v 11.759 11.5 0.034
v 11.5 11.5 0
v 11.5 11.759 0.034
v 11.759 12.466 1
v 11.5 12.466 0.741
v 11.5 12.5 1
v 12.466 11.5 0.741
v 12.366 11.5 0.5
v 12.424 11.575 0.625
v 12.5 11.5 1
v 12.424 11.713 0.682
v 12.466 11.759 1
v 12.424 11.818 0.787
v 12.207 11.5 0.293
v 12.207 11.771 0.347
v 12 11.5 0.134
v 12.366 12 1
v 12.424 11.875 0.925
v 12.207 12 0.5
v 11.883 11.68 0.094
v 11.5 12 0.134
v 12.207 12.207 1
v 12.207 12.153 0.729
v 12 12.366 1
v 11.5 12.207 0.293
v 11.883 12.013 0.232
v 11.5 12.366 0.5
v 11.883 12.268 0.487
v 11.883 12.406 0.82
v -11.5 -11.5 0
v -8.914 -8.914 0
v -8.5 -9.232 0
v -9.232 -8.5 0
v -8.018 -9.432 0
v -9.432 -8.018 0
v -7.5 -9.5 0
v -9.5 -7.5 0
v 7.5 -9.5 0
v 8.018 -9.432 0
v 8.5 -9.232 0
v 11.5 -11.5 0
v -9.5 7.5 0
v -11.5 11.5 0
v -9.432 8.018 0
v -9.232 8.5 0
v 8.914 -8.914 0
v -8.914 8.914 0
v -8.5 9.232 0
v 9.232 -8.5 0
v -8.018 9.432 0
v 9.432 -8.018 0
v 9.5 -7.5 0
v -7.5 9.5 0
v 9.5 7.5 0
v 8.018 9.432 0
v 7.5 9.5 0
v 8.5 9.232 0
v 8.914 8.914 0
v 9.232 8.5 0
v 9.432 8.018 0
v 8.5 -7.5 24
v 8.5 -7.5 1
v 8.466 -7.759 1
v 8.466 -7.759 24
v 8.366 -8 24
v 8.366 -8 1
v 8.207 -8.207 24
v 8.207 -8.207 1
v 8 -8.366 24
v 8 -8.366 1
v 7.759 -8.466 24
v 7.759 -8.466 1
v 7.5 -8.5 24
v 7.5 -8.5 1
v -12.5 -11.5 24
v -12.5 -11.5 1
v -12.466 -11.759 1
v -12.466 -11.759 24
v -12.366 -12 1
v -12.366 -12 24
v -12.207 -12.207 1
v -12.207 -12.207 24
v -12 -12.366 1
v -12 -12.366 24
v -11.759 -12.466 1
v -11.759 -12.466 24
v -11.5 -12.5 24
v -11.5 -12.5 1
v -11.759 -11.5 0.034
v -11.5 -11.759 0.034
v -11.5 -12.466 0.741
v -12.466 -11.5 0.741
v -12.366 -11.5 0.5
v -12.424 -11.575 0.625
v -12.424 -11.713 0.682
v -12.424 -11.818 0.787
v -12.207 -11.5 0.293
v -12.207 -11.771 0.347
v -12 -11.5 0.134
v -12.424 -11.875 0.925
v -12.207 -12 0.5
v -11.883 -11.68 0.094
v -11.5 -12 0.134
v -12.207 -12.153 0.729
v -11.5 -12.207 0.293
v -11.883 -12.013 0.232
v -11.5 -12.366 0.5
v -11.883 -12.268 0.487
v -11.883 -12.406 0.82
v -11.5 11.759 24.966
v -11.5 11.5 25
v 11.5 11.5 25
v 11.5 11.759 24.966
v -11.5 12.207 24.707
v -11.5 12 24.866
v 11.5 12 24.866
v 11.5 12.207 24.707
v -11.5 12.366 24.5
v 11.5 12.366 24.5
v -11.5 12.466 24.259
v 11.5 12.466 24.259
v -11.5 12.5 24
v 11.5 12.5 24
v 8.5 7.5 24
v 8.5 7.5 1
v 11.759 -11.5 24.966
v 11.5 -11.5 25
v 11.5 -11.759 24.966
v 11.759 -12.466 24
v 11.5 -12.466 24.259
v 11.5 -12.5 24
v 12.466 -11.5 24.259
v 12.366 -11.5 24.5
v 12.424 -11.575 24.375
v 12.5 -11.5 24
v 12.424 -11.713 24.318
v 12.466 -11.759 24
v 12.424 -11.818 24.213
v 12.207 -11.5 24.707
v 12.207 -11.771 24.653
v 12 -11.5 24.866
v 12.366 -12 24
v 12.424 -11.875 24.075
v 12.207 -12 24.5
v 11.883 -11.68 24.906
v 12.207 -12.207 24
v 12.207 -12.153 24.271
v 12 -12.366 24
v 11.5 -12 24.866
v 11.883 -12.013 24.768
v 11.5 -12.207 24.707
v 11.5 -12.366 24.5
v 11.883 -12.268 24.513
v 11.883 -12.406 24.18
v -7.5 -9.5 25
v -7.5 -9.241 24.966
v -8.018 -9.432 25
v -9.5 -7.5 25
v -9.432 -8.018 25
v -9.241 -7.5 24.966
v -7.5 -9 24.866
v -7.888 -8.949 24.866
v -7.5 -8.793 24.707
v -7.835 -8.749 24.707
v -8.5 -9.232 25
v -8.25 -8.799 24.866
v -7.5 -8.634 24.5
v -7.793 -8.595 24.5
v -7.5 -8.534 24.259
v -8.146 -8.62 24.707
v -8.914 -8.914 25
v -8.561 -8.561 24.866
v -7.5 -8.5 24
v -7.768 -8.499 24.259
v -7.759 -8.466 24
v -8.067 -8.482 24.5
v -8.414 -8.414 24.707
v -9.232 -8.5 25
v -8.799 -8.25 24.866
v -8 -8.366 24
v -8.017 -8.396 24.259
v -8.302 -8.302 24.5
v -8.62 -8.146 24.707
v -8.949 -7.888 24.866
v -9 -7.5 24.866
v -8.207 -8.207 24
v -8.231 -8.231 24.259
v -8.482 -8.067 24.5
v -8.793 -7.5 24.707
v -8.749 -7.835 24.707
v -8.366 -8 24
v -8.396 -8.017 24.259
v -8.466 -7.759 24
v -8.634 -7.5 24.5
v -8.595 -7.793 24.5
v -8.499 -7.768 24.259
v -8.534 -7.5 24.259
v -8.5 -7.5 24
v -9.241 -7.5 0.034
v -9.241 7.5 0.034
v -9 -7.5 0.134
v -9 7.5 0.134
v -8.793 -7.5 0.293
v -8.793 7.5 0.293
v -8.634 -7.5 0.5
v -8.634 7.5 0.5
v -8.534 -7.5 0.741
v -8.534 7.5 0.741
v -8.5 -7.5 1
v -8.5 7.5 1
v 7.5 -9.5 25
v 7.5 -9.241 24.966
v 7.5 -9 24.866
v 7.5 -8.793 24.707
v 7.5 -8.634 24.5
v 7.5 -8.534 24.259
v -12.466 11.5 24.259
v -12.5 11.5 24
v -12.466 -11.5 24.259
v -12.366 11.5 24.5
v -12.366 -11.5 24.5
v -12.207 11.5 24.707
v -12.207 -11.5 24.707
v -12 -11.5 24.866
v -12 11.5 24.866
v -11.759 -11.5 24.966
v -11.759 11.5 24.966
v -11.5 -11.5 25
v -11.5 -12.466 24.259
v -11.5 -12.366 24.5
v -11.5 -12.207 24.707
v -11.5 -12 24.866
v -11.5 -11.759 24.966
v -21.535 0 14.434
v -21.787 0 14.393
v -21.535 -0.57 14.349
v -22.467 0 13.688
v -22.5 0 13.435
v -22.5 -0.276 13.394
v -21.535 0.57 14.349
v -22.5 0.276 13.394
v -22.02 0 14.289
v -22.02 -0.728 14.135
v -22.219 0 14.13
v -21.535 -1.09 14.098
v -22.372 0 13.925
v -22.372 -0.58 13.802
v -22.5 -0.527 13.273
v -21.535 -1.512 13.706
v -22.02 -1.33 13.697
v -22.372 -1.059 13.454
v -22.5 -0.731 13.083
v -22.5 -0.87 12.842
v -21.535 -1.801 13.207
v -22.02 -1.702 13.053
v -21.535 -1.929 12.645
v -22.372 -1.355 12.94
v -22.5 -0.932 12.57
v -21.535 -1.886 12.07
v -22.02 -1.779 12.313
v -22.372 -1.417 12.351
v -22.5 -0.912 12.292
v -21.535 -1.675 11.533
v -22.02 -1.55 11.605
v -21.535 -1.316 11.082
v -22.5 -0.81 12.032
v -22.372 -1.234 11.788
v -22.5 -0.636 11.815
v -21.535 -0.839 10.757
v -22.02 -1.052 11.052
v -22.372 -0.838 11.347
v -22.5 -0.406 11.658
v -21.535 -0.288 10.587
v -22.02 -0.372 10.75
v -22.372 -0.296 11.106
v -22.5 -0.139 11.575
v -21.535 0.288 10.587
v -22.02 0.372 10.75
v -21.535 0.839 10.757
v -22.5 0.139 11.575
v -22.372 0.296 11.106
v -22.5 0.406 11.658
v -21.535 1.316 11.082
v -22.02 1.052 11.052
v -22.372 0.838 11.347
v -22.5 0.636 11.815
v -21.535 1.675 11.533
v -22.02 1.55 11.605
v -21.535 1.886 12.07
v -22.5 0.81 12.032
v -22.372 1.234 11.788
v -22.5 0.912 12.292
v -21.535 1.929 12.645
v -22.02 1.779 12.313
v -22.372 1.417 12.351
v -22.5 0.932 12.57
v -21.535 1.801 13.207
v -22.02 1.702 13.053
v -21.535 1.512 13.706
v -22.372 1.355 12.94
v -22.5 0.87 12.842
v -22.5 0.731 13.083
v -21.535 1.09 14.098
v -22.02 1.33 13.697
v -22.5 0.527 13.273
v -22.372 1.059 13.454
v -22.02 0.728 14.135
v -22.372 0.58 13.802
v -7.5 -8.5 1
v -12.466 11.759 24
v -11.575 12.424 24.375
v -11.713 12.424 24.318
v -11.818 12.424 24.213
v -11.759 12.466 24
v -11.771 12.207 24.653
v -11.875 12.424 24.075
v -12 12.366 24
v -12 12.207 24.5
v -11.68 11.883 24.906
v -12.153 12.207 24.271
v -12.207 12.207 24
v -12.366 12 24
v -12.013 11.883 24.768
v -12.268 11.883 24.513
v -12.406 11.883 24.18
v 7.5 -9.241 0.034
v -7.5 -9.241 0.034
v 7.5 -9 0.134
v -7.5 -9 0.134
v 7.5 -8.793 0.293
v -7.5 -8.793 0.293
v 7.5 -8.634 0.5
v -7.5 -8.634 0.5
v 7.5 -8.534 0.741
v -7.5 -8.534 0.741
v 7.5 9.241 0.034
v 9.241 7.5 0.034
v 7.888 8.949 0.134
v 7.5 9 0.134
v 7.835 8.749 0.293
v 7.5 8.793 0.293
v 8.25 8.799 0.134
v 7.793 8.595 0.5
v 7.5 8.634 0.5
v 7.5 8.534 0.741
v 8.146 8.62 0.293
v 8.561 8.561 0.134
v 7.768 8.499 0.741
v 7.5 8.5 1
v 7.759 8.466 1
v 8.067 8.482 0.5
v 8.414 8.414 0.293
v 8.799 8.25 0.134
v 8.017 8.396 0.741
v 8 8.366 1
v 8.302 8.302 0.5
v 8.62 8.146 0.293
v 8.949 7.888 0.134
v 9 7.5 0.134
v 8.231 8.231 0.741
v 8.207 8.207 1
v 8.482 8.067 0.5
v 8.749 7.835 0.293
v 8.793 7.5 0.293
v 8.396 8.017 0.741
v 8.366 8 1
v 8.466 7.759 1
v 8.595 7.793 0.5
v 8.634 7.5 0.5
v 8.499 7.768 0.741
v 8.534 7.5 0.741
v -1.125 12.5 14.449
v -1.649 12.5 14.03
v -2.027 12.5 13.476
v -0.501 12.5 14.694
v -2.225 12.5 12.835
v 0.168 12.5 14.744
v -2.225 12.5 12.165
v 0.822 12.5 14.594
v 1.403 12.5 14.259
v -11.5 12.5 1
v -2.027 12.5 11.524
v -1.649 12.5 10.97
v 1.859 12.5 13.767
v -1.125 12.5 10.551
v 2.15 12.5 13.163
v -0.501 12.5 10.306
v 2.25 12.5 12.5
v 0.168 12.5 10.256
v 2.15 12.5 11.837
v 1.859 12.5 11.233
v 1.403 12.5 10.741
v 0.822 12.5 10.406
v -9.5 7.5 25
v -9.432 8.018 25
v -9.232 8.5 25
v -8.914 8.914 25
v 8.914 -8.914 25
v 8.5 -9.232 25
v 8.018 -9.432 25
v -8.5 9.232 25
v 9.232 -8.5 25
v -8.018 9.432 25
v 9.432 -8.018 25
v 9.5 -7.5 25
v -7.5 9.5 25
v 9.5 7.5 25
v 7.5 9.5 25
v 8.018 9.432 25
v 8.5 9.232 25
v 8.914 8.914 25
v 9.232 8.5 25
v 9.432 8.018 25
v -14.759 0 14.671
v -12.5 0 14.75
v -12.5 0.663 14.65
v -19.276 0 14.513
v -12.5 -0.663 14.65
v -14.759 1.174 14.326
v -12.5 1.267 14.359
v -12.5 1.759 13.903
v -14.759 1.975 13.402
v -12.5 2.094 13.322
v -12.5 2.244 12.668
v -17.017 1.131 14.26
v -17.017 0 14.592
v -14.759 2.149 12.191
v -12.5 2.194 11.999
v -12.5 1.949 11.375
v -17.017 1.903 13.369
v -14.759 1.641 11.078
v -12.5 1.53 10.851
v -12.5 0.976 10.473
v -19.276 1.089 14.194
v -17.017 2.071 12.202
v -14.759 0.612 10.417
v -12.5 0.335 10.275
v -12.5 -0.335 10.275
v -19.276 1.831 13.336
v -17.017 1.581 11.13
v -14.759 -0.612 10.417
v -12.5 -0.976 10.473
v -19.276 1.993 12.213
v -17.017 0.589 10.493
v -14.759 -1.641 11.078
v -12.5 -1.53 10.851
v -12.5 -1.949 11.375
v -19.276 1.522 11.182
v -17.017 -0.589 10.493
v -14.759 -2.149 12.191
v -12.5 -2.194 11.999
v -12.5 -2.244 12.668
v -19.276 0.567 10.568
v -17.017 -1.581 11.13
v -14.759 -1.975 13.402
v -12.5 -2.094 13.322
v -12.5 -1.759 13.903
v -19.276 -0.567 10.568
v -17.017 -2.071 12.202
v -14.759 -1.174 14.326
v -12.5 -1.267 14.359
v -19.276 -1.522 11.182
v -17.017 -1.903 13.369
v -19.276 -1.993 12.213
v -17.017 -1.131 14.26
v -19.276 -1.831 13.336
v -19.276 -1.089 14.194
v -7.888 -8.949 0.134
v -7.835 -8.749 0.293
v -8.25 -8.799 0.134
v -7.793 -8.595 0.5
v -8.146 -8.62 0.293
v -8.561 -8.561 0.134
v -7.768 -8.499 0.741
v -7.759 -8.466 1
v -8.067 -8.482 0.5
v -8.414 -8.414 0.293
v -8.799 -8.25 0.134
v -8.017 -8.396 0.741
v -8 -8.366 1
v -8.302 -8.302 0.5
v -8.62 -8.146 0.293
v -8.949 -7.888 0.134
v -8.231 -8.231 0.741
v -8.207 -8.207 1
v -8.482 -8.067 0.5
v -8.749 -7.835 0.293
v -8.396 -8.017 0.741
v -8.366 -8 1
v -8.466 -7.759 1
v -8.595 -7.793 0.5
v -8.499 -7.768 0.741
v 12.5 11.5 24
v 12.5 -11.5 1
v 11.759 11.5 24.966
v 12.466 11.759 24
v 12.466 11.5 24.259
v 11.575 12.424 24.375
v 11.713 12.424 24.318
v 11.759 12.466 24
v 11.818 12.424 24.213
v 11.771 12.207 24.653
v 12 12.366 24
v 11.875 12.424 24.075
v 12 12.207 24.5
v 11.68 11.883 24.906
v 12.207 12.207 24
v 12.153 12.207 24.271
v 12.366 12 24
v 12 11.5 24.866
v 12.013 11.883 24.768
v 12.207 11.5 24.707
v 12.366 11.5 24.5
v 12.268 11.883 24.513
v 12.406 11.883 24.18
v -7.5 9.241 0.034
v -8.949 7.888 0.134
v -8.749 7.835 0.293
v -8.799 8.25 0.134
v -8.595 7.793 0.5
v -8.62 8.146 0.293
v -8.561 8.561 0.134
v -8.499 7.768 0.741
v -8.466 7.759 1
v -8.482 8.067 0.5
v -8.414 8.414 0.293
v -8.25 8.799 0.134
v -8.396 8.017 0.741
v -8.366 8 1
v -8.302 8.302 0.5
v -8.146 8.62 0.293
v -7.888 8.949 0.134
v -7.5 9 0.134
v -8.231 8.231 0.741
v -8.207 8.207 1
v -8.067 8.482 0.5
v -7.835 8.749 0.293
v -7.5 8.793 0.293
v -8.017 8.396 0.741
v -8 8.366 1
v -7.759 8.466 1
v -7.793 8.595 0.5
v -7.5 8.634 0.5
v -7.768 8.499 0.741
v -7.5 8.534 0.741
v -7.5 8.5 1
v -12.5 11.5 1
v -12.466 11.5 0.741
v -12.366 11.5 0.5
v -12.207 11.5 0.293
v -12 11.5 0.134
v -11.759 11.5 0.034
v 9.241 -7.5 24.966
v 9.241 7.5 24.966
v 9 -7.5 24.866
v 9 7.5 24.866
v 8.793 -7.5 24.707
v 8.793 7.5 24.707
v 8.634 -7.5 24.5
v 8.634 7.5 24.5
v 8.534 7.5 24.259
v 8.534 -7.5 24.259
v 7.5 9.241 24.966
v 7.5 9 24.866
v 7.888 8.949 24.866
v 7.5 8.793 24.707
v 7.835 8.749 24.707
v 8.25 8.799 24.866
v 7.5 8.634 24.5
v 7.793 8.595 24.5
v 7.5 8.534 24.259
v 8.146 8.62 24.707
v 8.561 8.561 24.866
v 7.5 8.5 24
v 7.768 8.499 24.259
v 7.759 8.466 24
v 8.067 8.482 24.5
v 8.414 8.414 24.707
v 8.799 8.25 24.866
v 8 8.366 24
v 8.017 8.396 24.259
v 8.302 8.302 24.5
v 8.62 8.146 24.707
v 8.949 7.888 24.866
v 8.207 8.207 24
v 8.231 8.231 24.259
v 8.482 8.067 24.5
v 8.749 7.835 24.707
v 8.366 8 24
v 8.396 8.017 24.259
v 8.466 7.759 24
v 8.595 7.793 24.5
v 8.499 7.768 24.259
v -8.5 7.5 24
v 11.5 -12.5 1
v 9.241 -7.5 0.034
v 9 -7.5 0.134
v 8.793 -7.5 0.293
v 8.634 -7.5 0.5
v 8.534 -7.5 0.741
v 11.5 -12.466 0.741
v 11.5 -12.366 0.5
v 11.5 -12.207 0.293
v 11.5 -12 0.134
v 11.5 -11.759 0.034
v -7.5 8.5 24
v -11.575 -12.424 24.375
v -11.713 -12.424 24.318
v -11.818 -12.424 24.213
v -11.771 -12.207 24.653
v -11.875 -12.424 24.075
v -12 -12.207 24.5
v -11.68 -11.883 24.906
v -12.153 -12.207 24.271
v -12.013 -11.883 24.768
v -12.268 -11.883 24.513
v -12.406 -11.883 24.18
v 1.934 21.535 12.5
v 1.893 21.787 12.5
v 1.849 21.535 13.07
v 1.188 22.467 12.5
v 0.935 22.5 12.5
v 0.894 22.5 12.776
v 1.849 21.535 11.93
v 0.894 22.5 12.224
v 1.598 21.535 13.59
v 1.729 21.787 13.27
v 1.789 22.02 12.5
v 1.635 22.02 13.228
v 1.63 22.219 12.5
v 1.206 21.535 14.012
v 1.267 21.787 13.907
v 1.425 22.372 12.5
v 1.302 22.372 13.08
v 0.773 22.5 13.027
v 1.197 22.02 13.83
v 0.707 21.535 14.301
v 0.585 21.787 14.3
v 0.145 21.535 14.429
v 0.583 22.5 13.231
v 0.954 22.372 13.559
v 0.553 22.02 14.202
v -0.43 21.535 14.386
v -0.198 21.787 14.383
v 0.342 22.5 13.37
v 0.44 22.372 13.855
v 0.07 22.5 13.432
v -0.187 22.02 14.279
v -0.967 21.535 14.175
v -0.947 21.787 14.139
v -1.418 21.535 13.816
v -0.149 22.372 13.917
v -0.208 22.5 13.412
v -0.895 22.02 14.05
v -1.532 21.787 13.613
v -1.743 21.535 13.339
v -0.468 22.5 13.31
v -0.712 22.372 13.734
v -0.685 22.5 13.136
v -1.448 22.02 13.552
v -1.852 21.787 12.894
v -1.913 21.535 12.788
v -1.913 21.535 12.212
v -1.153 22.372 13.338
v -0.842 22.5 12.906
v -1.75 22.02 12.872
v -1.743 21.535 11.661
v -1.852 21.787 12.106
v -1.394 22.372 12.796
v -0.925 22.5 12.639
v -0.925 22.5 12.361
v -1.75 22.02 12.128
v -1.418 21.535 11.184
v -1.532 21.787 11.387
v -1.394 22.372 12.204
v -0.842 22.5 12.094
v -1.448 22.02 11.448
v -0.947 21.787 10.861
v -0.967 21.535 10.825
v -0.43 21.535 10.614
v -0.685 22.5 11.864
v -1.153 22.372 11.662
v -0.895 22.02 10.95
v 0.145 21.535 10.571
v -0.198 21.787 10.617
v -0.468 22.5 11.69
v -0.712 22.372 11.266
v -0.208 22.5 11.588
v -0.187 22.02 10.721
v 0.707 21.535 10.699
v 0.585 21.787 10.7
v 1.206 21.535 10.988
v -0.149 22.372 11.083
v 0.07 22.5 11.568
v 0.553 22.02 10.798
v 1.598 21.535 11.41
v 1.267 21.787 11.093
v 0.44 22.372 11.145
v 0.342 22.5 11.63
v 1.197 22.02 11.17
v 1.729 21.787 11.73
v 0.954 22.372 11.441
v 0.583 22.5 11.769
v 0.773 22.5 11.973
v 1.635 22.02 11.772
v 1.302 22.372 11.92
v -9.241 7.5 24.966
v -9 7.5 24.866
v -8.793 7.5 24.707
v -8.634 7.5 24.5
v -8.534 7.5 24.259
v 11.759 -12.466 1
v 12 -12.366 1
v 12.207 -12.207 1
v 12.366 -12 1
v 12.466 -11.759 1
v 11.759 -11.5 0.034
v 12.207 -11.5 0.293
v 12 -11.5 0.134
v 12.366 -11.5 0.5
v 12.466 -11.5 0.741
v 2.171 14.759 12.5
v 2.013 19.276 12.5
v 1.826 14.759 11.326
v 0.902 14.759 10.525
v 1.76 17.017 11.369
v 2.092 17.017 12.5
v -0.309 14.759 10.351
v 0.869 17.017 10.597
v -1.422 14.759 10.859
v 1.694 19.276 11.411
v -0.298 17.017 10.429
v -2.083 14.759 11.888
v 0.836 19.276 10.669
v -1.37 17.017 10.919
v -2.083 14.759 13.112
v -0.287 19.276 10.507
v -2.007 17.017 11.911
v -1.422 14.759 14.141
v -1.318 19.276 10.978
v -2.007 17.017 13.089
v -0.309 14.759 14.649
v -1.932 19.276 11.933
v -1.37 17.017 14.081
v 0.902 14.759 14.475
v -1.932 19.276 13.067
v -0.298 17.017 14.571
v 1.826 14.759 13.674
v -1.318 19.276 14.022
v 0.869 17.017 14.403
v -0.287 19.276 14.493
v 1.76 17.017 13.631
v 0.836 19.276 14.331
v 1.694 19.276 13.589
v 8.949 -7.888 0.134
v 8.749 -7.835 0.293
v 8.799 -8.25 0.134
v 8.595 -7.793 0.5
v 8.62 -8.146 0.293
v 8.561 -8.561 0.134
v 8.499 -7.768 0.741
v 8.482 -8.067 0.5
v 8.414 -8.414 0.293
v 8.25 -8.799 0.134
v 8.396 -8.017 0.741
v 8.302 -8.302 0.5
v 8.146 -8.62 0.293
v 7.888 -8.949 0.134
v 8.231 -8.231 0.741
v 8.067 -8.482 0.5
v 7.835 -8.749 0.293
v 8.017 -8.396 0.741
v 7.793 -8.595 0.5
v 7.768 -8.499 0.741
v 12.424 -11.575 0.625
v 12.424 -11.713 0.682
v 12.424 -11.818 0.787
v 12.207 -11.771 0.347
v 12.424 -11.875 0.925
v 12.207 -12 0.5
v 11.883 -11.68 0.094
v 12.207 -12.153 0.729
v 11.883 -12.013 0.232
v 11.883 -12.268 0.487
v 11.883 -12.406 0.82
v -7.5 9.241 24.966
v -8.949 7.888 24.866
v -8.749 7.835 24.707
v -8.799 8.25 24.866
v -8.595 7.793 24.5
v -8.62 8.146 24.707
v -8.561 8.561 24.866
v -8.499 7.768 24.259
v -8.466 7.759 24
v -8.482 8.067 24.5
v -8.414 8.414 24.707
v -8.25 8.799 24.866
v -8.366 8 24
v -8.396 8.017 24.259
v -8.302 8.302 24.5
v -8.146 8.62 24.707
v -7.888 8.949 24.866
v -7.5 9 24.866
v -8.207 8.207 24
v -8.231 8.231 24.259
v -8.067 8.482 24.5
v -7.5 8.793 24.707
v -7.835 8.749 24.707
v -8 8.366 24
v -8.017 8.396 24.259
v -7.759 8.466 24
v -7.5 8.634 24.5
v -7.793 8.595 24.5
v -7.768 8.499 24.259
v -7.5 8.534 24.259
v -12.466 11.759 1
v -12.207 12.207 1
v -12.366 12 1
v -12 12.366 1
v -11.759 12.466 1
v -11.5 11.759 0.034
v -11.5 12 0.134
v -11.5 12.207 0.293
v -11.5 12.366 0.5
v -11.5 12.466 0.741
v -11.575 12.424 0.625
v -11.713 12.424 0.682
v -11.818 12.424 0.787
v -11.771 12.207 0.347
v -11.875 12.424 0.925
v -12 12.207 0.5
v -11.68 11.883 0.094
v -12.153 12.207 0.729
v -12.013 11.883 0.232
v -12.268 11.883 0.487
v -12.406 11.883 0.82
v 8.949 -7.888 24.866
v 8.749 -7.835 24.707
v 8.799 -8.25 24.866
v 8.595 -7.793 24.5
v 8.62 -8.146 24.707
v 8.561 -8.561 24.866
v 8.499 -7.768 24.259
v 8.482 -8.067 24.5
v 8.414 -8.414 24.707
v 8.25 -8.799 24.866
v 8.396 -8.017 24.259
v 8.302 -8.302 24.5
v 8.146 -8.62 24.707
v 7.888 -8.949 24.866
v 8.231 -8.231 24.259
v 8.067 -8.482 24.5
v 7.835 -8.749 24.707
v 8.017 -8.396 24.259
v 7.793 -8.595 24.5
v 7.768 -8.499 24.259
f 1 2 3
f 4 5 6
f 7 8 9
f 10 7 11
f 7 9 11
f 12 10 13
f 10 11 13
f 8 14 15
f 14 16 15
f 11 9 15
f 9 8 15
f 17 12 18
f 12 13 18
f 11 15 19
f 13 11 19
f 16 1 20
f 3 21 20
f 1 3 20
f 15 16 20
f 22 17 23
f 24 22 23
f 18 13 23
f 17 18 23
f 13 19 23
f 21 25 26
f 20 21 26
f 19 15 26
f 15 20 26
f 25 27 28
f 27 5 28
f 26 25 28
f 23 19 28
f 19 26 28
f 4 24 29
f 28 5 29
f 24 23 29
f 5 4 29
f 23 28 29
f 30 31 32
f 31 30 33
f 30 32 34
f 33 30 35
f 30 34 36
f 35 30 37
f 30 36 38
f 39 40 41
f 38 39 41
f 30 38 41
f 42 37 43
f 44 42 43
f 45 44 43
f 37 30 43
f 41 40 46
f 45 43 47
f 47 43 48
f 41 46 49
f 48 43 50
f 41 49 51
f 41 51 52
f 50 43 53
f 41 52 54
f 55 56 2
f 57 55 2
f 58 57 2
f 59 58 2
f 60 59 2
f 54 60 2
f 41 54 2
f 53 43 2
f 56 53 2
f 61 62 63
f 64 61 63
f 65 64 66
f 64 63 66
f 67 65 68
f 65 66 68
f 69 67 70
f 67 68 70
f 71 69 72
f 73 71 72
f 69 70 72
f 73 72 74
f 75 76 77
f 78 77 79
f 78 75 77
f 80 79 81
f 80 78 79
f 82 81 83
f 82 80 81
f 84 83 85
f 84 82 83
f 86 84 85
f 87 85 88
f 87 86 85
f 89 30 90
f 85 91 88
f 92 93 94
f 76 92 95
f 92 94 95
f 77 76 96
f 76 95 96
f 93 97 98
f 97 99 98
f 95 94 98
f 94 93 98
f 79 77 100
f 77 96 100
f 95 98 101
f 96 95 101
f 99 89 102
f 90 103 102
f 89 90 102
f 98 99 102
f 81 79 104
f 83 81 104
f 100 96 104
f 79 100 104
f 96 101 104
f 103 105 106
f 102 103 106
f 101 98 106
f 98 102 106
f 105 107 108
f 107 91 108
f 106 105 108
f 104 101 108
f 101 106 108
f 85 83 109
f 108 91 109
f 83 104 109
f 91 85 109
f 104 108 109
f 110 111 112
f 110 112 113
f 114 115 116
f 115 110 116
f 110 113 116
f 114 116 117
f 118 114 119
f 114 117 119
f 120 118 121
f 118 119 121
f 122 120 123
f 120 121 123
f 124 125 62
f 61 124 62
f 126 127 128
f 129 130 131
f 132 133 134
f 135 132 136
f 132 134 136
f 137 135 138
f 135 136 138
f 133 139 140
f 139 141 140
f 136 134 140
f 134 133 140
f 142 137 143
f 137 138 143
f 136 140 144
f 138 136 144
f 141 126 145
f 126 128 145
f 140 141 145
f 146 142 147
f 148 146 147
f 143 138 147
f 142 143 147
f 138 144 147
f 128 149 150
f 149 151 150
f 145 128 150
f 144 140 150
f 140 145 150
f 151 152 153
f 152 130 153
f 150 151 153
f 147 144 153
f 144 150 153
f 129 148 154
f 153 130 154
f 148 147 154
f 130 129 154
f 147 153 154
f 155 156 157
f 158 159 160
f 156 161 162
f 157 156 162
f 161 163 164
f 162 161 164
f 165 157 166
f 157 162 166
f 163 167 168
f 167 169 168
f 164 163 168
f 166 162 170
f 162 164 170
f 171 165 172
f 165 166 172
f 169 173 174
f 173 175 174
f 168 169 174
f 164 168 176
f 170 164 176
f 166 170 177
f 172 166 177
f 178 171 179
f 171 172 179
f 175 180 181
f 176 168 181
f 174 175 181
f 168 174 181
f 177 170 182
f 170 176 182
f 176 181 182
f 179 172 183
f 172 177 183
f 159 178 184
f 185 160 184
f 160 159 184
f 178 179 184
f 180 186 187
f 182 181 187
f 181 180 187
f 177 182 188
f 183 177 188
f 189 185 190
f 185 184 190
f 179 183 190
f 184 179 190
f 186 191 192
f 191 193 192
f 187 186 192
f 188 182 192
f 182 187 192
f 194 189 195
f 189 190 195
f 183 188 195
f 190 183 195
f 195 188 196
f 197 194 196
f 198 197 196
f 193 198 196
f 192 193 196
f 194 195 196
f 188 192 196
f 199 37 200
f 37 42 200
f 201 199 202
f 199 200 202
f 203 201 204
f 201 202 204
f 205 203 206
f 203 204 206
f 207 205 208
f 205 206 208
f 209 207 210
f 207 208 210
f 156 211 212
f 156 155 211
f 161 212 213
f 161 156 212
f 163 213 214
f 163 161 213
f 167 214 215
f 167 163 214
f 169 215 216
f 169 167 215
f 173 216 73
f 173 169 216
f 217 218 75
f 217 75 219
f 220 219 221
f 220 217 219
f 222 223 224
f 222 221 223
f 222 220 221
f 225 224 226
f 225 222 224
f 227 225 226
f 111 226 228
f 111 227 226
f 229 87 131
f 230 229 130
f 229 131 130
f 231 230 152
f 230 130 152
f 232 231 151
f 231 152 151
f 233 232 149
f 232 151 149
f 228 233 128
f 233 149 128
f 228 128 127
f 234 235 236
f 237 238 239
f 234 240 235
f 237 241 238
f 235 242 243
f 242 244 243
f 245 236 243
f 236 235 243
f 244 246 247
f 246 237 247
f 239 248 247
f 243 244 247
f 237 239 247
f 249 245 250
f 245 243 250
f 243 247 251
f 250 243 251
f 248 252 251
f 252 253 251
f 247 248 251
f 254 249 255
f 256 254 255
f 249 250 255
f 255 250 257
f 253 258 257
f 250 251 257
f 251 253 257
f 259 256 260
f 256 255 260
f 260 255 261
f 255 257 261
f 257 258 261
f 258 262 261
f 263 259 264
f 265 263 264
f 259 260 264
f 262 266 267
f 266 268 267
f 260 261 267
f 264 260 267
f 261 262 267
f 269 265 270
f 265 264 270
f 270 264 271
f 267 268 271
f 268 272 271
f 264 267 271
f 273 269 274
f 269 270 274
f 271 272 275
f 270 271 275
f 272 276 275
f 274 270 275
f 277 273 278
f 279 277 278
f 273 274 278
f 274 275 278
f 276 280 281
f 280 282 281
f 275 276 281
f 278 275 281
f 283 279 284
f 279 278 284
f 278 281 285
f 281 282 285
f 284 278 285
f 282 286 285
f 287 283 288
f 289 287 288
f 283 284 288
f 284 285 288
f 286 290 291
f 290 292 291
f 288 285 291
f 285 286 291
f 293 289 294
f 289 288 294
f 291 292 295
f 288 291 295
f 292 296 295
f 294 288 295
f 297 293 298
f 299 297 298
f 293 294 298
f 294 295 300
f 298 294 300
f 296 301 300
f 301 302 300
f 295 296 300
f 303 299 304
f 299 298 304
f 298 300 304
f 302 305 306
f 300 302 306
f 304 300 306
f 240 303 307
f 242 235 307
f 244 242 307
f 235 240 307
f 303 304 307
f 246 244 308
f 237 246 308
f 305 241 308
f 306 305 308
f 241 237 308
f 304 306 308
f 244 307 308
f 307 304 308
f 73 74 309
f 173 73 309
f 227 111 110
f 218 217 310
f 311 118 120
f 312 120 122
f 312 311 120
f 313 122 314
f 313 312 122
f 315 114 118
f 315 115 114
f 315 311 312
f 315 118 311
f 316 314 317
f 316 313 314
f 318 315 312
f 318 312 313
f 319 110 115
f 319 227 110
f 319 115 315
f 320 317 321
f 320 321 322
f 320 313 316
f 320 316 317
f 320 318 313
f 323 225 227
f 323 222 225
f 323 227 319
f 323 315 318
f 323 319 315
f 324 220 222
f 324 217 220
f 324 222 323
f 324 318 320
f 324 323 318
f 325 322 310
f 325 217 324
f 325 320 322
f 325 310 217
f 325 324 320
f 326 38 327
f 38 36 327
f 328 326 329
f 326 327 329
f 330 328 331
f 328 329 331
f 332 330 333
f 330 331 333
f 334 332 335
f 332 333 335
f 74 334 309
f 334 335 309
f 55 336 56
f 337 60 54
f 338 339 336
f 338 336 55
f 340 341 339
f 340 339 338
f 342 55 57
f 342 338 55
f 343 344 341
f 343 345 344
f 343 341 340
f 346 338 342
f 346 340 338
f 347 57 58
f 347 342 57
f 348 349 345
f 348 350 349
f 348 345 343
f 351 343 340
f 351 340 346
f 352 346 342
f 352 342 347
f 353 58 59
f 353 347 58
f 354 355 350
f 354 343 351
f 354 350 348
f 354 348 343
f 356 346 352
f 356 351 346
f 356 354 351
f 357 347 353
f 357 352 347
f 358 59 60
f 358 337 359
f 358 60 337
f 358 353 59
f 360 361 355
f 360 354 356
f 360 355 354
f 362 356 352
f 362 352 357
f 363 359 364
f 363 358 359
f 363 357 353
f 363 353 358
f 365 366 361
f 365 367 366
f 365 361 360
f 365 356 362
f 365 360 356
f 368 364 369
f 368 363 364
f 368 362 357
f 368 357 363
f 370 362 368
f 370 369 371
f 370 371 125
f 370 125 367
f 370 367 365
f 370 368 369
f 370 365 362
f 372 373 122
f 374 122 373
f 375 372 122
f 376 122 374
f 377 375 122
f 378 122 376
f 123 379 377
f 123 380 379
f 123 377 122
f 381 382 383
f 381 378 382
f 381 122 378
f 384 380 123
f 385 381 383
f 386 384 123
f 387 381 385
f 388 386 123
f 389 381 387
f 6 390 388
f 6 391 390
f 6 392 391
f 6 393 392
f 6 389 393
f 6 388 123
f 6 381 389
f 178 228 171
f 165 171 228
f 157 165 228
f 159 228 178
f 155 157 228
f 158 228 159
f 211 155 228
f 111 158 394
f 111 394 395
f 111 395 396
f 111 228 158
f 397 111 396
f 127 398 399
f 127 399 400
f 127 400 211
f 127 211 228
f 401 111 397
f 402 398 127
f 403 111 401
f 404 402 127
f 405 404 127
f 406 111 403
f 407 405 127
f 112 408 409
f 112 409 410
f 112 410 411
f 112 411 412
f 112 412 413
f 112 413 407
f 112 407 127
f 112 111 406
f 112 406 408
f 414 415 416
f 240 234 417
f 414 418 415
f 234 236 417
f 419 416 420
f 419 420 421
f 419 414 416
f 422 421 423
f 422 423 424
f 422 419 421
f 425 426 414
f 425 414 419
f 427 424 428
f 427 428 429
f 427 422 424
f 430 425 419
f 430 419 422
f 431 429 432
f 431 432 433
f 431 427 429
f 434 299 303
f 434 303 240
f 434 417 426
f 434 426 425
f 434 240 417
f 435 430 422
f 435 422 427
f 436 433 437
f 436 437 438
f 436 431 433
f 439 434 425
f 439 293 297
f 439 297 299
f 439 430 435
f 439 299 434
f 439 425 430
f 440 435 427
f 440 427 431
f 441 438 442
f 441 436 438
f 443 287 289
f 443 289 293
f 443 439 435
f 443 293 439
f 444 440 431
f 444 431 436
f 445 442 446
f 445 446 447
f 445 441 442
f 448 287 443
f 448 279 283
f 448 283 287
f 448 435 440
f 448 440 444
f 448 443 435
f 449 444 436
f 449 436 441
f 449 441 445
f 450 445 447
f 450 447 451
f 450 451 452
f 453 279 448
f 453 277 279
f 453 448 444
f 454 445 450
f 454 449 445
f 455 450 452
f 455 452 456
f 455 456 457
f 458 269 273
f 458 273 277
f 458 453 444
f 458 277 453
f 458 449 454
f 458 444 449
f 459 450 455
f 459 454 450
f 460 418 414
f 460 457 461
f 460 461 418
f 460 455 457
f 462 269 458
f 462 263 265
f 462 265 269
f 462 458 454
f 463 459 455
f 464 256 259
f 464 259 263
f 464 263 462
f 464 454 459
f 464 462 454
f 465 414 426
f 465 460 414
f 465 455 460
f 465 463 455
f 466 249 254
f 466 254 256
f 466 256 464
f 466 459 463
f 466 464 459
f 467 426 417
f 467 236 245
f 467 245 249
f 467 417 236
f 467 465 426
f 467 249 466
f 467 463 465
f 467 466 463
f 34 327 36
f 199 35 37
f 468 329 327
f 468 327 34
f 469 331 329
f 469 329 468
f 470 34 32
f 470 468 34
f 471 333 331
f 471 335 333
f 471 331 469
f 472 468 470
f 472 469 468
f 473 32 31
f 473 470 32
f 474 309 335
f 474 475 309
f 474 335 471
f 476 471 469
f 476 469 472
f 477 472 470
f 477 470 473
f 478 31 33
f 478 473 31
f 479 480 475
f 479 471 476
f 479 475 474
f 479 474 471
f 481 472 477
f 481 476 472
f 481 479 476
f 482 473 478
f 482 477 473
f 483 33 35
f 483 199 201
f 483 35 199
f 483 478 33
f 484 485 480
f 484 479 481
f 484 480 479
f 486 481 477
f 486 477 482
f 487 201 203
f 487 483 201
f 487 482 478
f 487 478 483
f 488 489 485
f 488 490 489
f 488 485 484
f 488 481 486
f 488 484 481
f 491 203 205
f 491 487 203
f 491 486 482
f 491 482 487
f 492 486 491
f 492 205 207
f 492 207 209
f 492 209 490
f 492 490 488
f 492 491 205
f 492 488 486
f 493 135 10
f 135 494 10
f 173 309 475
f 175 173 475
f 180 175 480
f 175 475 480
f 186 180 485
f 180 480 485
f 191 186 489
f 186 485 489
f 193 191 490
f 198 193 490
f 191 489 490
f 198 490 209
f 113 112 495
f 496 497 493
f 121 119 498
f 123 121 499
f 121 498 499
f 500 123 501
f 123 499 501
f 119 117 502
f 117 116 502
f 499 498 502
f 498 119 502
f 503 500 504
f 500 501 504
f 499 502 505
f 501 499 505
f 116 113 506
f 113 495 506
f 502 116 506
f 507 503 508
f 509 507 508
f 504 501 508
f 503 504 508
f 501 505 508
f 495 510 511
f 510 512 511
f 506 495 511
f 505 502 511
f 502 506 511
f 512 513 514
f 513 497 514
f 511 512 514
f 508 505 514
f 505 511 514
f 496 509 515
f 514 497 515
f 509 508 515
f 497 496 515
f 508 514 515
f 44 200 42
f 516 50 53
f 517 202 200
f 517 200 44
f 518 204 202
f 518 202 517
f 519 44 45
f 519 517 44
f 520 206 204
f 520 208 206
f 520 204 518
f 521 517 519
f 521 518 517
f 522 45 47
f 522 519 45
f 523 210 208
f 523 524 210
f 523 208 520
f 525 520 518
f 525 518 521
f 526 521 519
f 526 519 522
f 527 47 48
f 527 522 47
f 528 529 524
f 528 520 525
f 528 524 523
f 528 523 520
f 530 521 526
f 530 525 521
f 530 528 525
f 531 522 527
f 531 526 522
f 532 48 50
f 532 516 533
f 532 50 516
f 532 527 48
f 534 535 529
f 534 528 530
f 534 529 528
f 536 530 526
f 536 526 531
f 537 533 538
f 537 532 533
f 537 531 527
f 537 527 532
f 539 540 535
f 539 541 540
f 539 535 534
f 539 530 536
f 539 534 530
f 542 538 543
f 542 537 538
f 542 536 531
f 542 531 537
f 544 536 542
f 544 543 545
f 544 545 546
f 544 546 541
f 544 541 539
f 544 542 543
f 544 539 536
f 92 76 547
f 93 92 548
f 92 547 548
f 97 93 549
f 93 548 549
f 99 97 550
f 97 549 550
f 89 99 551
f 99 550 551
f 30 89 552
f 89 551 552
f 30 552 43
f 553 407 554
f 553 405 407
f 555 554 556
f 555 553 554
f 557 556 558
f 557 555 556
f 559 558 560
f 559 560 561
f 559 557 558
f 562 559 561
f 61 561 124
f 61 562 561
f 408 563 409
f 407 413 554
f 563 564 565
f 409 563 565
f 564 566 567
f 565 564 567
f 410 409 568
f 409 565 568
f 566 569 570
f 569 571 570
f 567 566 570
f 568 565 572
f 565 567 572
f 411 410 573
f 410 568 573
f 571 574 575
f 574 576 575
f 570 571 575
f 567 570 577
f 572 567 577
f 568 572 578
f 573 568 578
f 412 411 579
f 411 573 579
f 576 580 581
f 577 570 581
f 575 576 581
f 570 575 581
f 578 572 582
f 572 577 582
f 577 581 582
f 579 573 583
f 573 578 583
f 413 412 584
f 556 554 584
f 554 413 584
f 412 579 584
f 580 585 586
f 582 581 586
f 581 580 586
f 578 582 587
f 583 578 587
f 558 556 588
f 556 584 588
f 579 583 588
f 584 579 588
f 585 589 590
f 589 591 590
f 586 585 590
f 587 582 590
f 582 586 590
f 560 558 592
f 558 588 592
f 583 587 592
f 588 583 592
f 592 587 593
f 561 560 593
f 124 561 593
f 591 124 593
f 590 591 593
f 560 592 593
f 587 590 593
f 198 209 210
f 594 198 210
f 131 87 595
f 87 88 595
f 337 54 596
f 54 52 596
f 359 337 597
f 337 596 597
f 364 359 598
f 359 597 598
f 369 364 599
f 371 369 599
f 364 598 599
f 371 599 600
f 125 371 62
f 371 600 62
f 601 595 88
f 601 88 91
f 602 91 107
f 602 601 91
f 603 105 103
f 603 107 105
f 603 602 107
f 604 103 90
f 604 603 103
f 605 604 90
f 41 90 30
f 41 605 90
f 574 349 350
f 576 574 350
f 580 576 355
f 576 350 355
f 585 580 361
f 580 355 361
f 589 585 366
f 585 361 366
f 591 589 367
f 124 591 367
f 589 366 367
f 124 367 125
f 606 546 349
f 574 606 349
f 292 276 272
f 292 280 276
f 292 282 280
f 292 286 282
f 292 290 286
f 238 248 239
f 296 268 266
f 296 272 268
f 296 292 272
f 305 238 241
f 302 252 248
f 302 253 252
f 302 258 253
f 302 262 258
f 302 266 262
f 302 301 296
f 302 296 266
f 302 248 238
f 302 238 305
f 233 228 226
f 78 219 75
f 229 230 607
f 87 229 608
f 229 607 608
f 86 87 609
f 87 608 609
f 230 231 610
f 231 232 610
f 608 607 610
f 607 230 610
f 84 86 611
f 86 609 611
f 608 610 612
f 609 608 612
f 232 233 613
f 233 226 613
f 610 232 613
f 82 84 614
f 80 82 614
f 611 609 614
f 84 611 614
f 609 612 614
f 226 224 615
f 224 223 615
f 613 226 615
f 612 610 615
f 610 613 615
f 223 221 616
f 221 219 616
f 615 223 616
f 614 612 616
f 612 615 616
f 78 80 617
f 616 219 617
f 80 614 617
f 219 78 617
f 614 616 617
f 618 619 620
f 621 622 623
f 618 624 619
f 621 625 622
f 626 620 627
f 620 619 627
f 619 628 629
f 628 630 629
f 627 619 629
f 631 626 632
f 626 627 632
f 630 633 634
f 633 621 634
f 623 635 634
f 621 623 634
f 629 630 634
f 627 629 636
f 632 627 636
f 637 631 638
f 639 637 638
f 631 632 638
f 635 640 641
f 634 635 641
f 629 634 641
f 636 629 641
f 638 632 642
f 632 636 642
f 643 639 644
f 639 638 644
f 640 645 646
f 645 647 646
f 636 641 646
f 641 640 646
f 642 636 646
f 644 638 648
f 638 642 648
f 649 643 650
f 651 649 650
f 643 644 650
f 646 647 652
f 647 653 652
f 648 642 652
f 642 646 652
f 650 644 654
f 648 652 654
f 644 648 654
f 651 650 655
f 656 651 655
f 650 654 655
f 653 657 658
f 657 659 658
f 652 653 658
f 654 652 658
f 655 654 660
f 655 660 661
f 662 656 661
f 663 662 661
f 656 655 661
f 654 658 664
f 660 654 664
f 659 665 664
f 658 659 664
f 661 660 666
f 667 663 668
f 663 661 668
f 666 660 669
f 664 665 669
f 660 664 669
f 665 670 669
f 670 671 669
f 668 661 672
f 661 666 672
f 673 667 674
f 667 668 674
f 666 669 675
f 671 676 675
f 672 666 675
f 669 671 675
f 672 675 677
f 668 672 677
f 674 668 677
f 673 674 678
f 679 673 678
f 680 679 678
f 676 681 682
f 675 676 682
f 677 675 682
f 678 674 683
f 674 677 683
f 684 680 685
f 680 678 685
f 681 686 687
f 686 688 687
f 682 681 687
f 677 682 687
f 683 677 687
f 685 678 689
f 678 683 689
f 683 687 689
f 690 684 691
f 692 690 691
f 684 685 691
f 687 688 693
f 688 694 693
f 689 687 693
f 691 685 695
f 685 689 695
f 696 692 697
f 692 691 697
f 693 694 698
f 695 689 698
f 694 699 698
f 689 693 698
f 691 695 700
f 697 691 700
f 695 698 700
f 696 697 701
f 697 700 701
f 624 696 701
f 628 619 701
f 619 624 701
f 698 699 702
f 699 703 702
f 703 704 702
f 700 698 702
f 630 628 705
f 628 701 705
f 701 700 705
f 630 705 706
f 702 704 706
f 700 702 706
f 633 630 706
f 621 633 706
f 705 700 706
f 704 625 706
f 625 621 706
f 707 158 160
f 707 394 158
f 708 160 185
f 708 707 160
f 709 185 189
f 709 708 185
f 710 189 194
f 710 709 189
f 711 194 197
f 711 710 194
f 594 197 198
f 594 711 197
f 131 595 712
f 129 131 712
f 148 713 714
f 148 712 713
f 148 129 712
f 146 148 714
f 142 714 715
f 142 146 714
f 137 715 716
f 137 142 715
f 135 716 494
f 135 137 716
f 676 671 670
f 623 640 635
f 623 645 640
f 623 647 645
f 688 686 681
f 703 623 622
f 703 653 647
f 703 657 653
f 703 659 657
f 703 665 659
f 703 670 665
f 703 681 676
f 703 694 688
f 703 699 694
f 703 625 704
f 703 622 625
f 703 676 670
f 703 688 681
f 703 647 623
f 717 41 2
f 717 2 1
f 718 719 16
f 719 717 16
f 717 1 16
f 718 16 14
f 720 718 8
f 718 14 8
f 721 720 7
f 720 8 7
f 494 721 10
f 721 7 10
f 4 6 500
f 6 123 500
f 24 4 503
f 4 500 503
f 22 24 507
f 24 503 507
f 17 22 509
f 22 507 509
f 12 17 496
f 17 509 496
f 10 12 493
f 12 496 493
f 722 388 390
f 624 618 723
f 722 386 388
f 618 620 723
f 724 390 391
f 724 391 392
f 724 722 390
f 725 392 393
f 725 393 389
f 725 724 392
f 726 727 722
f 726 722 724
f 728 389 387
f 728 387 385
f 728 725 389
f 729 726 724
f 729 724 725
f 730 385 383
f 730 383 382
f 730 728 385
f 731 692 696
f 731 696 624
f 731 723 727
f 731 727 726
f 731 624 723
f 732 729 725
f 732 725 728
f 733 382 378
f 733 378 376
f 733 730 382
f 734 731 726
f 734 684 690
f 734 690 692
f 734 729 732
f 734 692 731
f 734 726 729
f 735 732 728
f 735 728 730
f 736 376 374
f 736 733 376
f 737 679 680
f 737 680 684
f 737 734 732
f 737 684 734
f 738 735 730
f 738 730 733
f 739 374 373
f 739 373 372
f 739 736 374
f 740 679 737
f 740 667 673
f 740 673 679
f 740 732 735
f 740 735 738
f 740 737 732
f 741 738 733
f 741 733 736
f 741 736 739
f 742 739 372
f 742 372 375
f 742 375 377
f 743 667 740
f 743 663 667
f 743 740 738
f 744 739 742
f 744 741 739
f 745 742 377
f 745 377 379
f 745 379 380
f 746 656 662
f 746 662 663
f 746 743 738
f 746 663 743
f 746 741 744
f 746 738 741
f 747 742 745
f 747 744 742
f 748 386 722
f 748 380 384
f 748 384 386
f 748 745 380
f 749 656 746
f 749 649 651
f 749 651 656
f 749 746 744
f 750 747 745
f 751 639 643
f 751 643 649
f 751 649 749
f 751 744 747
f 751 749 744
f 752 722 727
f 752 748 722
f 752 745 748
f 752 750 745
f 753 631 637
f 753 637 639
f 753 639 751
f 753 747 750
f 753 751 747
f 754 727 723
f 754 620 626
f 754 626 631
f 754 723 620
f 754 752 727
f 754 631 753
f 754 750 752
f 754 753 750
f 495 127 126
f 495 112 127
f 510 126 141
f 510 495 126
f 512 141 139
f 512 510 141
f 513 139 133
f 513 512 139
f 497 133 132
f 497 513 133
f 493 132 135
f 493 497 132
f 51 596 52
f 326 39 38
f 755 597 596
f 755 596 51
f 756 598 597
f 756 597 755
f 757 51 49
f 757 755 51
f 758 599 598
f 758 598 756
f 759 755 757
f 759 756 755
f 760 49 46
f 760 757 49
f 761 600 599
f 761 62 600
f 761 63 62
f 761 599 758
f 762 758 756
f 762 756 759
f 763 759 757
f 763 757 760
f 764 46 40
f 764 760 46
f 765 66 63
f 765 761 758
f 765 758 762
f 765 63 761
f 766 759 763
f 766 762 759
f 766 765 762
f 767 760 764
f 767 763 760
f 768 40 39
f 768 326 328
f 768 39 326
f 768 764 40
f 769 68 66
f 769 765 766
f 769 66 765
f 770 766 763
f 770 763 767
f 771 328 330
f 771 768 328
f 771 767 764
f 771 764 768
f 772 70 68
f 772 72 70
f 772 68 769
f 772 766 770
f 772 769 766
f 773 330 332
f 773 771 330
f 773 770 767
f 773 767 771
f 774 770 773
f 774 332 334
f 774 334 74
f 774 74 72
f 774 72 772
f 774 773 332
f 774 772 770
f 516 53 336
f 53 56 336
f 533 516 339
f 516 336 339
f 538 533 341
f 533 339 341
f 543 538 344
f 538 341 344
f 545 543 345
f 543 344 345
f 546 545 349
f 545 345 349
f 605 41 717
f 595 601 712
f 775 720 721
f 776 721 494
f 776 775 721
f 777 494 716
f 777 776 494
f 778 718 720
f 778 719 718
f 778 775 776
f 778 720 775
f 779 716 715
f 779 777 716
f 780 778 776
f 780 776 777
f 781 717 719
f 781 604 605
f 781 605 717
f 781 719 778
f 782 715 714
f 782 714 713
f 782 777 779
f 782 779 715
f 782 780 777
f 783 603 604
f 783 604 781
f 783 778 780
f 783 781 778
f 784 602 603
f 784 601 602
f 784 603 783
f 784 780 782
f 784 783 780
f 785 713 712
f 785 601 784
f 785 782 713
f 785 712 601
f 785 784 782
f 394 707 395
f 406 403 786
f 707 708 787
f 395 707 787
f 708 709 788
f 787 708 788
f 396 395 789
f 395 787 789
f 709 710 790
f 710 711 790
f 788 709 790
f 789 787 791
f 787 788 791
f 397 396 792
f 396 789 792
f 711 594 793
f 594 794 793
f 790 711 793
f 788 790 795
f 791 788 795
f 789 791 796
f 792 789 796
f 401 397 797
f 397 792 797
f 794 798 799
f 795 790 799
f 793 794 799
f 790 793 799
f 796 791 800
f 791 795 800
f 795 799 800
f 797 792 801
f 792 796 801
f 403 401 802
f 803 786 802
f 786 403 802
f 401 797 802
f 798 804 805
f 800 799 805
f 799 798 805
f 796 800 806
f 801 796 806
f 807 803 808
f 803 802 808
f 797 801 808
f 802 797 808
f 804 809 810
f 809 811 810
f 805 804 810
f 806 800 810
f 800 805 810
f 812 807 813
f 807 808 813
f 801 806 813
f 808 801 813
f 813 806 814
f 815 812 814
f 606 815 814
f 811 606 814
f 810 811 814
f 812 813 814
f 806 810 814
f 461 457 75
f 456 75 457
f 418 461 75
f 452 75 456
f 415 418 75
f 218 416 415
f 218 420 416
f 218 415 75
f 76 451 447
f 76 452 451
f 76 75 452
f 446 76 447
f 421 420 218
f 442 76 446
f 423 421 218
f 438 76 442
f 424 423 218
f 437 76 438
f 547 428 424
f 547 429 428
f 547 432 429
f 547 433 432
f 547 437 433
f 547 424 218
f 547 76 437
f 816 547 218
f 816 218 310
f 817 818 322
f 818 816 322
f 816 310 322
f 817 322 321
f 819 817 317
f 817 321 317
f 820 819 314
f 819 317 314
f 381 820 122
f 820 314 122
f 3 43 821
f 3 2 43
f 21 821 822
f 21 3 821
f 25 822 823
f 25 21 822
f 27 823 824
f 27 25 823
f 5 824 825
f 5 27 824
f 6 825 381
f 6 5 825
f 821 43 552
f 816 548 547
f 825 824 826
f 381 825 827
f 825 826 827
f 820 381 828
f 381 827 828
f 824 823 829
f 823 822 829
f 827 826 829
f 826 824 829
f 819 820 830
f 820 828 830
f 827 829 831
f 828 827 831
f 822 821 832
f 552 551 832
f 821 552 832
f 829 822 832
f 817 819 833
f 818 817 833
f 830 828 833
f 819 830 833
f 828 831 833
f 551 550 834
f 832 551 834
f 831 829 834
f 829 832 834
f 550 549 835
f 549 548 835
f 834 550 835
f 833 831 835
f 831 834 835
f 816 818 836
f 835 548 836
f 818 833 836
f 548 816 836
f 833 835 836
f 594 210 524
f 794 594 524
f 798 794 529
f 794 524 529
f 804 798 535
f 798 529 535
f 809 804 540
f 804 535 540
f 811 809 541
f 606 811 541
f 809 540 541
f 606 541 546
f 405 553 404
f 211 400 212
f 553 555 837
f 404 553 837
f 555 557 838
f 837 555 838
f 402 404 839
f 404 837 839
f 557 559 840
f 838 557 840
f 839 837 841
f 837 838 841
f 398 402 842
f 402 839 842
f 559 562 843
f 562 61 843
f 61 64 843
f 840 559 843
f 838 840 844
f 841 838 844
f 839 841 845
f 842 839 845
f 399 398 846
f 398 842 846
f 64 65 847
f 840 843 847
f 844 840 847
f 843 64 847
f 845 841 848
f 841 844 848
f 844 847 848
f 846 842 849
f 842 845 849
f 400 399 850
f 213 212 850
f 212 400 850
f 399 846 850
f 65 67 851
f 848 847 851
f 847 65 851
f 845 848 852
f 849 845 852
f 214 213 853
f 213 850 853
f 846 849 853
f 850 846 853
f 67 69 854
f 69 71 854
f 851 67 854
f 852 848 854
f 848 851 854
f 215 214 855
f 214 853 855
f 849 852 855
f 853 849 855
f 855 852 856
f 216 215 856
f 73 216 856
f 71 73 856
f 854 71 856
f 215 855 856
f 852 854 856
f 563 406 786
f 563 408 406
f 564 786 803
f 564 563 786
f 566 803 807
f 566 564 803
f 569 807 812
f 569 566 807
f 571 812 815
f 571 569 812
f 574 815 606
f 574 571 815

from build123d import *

# Parameters (mm, degrees)
SKETCH1_W           = 25
SKETCH1_H           = 25
BOSS_EXTRUDE1_DEPTH = 25
SKETCH3_R           = 2.25
BOSS_EXTRUDE2_DEPTH = 10
BOSS_EXTRUDE2_TAPER = 2
SKETCH4_R           = 2.25
BOSS_EXTRUDE3_DEPTH = 10
BOSS_EXTRUDE3_TAPER = 2
CUT_EXTRUDE1_DEPTH  = 25
FILLET1_R           = 1


with BuildPart() as part:
    # Sketch1 → Boss-Extrude1 (new body)
    with BuildSketch(Plane.XY):
        Rectangle(SKETCH1_W, SKETCH1_H)
    extrude(amount=BOSS_EXTRUDE1_DEPTH)

    # Sketch3 → Boss-Extrude2 (add)
    with BuildSketch(Plane.ZY.offset(12.5)):
        with Locations((12.5, 0)):
            Circle(SKETCH3_R)
    extrude(amount=BOSS_EXTRUDE2_DEPTH, taper=BOSS_EXTRUDE2_TAPER)

    # Sketch4 → Boss-Extrude3 (add)
    with BuildSketch(Plane(origin=(0, 12.5, 0), x_dir=(1, 0, 0), z_dir=(0, 1, 0))):
        with Locations((1e-09, -12.5)):
            Circle(SKETCH4_R)
    extrude(amount=BOSS_EXTRUDE3_DEPTH, taper=BOSS_EXTRUDE3_TAPER)

    # Sketch5 → Cut-Extrude1 (cut)
    with BuildSketch(Plane(origin=(0, 0, 0), x_dir=(-1, 0, 0), z_dir=(0, 0, -1))):
        with BuildLine():
            Line((-7.5, -8.5), (7.5, -8.5))
            ThreePointArc((7.5, -8.5), (8.207106781, -8.207106781), (8.5, -7.5))
            Line((8.5, -7.5), (8.5, 7.5))
            ThreePointArc((8.5, 7.5), (8.207106781, 8.207106781), (7.5, 8.5))
            Line((7.5, 8.5), (-7.5, 8.5))
            ThreePointArc((-7.5, 8.5), (-8.207106781, 8.207106781), (-8.5, 7.5))
            Line((-8.5, 7.5), (-8.5, -7.5))
            ThreePointArc((-8.5, -7.5), (-8.207106781, -8.207106781), (-7.5, -8.5))
        make_face()
    extrude(amount=-CUT_EXTRUDE1_DEPTH, mode=Mode.SUBTRACT)

    # Fillet1
    fillet1_edges = [part.edges().sort_by_distance(p)[0] for p in [
        (-12.5, 0, 25),
        (0, -12.5, 25),
        (-22.5, 0, 10.599207695),
        (-1.900792304, 22.5, 12.5),
        (8.207106781, -8.207106781, 0),
        (0, -8.5, 0),
        (-8.207106781, -8.207106781, 0),
        (-8.5, 0, 0),
        (-8.207106781, 8.207106781, 0),
        (0, 8.5, 0),
        (8.207106781, 8.207106781, 0),
        (8.5, 0, 0),
        (8.207106781, -8.207106781, 25),
        (8.5, 0, 25),
        (8.207106781, 8.207106781, 25),
        (0, 8.5, 25),
        (-8.207106781, 8.207106781, 25),
        (-8.5, 0, 25),
        (-8.207106781, -8.207106781, 25),
        (0, -8.5, 25),
        (12.5, 0, 25),
        (0, -12.5, 0),
        (-12.5, 0, 0),
        (0, 12.5, 0),
        (12.5, 0, 0),
        (0, 12.5, 25),
        (12.5, -12.5, 12.5),
        (-12.5, -12.5, 12.5),
        (-12.5, 12.5, 12.5),
        (12.5, 12.5, 12.5),
    ]]
    fillet(fillet1_edges, radius=FILLET1_R)


solid = part.part
